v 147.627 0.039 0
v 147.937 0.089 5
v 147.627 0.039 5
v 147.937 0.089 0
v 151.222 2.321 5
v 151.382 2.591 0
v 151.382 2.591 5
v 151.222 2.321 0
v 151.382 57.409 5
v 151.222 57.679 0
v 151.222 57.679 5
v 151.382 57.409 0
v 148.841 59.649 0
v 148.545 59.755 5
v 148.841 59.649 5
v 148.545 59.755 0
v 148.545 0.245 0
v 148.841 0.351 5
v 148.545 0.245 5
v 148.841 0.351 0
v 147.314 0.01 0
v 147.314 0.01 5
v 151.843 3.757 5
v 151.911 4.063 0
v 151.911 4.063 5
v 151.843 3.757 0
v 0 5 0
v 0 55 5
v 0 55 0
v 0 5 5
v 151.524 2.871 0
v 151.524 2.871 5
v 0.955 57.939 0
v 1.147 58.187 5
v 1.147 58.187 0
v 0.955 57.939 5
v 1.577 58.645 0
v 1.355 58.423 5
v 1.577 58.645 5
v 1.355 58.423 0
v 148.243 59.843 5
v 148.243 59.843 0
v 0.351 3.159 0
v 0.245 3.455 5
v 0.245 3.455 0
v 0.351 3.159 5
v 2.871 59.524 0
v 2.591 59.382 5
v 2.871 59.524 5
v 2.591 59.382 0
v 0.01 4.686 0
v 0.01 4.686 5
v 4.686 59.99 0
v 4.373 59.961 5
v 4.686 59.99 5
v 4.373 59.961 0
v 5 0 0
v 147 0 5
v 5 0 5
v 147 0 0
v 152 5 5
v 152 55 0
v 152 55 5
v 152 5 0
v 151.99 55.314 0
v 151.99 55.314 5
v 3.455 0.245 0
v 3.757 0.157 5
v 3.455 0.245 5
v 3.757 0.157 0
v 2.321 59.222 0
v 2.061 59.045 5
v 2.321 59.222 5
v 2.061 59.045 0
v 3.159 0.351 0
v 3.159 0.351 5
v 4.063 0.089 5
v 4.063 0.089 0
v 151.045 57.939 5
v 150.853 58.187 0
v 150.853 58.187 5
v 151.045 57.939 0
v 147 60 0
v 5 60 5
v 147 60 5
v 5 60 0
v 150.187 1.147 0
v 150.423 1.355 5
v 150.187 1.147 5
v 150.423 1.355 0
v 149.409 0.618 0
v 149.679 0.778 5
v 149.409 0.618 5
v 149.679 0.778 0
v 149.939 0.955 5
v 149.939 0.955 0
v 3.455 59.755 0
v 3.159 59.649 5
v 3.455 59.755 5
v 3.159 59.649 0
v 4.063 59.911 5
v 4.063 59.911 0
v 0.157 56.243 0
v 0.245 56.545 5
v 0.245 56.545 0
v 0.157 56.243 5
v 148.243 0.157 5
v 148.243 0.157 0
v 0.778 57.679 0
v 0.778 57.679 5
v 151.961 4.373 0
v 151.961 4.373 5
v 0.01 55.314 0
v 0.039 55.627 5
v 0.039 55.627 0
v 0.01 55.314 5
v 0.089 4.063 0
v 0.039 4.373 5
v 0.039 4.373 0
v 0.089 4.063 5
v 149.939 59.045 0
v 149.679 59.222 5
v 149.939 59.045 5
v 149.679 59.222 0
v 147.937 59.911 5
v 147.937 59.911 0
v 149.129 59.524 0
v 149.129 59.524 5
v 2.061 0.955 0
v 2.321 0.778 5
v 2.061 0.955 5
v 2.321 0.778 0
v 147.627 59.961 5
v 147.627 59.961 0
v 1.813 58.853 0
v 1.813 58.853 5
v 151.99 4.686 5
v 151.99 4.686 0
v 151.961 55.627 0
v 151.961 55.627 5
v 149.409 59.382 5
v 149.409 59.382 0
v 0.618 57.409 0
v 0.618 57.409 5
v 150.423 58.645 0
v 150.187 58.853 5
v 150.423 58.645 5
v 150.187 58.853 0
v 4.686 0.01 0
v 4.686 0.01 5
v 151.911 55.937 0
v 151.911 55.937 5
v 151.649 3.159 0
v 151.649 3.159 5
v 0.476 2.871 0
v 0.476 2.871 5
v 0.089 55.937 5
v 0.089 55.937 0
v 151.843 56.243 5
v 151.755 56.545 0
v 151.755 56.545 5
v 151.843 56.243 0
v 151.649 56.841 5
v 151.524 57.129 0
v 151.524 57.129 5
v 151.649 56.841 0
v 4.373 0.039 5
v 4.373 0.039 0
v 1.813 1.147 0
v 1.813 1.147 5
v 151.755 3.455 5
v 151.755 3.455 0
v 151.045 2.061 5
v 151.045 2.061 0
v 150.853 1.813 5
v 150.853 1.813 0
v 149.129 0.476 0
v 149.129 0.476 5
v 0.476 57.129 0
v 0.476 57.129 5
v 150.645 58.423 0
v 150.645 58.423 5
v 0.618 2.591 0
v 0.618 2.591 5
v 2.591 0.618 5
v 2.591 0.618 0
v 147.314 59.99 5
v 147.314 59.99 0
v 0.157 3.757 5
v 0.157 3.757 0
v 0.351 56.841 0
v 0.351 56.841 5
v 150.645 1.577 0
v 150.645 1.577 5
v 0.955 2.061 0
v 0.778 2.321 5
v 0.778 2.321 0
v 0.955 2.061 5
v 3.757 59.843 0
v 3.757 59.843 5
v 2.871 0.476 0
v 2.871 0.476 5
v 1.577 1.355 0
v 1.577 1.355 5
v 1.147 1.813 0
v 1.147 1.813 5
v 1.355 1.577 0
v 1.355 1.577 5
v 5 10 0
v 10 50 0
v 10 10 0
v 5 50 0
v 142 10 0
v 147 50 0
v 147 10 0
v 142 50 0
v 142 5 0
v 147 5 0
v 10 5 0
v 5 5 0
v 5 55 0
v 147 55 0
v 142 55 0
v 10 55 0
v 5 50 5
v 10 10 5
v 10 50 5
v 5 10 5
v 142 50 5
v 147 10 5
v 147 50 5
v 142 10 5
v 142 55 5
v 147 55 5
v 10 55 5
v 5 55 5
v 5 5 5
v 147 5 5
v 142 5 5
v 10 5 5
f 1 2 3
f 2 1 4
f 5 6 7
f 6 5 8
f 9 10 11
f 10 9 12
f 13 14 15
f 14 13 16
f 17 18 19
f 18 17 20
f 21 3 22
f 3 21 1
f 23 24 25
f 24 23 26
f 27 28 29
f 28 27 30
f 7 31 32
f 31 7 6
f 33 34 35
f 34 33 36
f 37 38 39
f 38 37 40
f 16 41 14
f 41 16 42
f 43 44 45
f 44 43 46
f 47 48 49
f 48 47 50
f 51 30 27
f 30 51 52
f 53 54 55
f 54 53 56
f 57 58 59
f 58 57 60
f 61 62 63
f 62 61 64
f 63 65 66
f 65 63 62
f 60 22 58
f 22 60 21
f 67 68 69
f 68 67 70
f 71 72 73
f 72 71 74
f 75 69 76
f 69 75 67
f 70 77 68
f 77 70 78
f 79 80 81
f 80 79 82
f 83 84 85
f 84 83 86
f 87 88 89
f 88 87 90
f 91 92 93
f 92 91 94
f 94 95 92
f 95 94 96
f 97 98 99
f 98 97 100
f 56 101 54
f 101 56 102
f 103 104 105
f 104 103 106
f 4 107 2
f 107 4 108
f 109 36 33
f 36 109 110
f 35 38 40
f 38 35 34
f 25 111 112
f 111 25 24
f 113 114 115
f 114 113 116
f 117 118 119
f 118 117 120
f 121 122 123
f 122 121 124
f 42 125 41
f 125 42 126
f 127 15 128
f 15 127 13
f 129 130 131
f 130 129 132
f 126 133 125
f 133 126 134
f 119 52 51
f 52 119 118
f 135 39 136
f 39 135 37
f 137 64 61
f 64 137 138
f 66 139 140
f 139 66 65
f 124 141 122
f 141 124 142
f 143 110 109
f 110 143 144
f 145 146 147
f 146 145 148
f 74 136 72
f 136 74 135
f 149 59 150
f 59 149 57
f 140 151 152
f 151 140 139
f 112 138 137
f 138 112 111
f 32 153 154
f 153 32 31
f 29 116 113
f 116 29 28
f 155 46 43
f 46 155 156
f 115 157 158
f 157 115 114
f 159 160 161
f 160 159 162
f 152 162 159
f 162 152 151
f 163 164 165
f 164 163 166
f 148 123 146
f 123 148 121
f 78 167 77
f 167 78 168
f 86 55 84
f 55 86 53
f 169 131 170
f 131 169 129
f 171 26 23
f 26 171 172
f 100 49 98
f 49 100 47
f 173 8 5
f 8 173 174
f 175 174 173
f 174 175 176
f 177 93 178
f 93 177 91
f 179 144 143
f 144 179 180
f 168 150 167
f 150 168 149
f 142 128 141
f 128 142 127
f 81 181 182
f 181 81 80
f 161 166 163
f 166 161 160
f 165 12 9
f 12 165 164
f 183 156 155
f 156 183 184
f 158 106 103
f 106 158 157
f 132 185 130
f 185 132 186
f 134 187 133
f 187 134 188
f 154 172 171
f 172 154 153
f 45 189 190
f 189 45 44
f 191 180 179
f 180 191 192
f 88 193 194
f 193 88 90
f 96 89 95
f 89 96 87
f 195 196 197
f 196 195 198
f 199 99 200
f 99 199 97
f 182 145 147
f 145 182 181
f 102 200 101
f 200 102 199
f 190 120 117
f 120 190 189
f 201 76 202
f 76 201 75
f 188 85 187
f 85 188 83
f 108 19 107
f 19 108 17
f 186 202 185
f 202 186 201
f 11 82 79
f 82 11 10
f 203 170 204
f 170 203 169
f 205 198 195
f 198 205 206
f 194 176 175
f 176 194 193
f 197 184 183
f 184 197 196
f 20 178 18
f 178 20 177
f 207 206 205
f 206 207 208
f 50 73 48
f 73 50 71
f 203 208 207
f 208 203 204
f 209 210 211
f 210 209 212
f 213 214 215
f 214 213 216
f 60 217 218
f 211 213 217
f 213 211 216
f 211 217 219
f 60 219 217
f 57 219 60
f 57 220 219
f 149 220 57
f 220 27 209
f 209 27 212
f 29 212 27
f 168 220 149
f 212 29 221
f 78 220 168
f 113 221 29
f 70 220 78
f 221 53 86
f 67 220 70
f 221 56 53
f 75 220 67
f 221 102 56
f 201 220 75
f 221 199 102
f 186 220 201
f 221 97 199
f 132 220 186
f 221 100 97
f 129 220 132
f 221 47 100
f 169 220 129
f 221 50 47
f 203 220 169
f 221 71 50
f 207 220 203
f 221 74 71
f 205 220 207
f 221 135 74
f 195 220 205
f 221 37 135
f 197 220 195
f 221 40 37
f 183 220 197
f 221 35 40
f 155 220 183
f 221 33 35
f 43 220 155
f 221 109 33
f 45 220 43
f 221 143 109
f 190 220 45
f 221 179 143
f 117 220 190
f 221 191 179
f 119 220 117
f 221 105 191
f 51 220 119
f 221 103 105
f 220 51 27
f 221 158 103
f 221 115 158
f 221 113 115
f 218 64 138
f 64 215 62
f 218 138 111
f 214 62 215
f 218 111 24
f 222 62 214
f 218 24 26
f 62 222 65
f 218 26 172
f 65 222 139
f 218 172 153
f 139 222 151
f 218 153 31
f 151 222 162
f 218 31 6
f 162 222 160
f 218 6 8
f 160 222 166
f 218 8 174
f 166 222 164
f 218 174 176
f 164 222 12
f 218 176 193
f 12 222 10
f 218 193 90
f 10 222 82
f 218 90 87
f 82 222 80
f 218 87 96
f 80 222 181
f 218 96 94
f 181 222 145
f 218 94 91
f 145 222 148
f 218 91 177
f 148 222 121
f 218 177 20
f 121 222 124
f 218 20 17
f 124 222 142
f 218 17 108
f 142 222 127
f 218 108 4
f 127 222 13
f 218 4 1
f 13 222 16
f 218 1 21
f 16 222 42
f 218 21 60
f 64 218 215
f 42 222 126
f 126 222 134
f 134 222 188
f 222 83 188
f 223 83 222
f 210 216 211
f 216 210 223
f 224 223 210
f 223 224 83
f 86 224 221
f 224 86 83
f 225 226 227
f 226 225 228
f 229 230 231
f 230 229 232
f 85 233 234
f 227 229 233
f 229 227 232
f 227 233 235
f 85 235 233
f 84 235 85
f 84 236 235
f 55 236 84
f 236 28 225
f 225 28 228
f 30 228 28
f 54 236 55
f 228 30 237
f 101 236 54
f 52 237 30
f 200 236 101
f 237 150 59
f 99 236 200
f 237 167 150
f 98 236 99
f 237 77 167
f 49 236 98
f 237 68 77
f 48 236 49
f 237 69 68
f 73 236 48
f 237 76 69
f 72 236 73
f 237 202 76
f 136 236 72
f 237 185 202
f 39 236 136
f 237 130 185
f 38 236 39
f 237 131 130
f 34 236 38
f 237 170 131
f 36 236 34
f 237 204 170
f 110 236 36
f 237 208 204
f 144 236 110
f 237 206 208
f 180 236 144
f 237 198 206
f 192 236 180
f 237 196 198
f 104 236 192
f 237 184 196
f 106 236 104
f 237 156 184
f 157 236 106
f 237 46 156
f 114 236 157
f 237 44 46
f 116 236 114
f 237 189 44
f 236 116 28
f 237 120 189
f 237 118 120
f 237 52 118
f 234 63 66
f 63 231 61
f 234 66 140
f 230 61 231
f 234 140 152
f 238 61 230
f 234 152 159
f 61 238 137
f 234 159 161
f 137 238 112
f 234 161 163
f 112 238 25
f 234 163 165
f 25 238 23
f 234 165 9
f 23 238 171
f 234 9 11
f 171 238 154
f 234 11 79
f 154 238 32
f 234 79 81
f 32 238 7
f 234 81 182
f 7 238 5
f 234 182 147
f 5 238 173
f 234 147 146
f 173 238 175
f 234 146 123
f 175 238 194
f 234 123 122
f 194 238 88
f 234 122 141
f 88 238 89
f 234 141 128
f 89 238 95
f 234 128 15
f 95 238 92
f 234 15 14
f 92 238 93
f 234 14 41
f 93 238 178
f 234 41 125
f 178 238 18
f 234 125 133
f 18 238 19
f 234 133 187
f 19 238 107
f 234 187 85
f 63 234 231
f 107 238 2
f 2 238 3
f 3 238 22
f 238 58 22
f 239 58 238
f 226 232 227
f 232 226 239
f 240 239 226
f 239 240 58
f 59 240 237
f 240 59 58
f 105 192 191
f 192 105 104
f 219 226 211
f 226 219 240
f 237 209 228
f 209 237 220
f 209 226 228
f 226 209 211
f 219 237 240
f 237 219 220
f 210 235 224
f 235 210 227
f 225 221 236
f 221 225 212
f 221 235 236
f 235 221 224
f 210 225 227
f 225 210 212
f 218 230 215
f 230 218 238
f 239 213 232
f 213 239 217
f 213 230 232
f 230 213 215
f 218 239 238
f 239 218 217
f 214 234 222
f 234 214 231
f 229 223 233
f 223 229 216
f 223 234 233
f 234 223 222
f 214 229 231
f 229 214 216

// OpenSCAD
/*
 * Simple Modular Frame v1.0
 *
 * http://www.thingiverse.com/thing:1902773
 *
 * By: Maxstupo
 */


/* [Frame Settings] */
// (Select what part to generate):
framePart = 1; // [0:3]

// (The width of the plate):
width = 152;

// (The length of the plate):
length = 60;

// (The height of the plate, also used for the stilt generation):
height = 5;

// (The stilt size, and the stilt slot size):
slotSize = 5;

// (The spacing between the edges of the plate and the stilt slots):
spacing = 5;

// (The plate fillet):
fillet = 10;



/* [Frame 2 Settings] */
// (The width between the mount holes from center-to-center):
mountWidth = 20;

// (The length between the mount holes from center-to-center):
mountLength = 40;

// (The diameter of the mount holes):
mountHoleSize = 3;

// (The spacing from the edge of the plate):
mountSpacingFromEdge = 10;


/* [Frame 3 Settings] */
// (The height of the stilt):
stiltHeight = 50;


/* [Misc] */
// (The tolerance to apply to both plates or stilts):
tolerance = 0;

// (The tolerance for the test part #0):
toleranceTest = 0;

$fn=100;

if(framePart == 0) {
    toleranceTest(rodSize=5,rodLength=30,thickness=5,tolerance=toleranceTest);  
    
} else if (framePart == 1) {
    plate(width, length, height, slotSize + tolerance / 2, spacing, fillet);

} else if (framePart == 2) {
    plateWithMotorMountHoles(width, length, height, slotSize + tolerance / 2, spacing, fillet, mountWidth, mountLength, mountHoleSize, mountSpacingFromEdge);

} else if (framePart == 3) {
    stilt(stiltHeight, slotSize - tolerance / 2, height);

}


module toleranceTest(rodSize=5, rodLength=30, thickness=5,tolerance=0){
    // The hole.
    difference(){
        rs=rodSize+(tolerance/2);
        cube([thickness * 2 + rs, thickness * 2 + rs, rodLength / 3]);
        translate([(thickness * 2 + rs) / 2 - rs / 2, (thickness * 2 + rs) / 2 - rs / 2, -1]) cube([rs, rs, rodLength / 3 + 2]);
    }
    
    // The rod.
    translate([thickness * 2 + rodSize + 10, 0, 0]) cube([rodSize - (tolerance / 2), rodLength, rodSize - (tolerance / 2)]);
}

module plate(width=152, length=60, height=5, slotSize=5, spacing=5, fillet=10) {
    r = min(length, fillet);
    
    difference(){
       
        // The plate. 
        if(r > 0){
            hull(){
                translate([(r / 2), (r / 2), 0]) cylinder(h=height, d=r);
                translate([width - (r / 2), (r / 2), 0]) cylinder(h=height, d=r);
                translate([width - (r / 2), length - (r / 2), 0]) cylinder(h=height, d=r);
                translate([(r / 2), length - (r / 2), 0]) cylinder(h=height, d=r);
            }
        }else{
            cube([width, length, height]);
        }
        
        // Stilt holes.
        translate([spacing, spacing, -1]) cube([slotSize, slotSize, height + 2]);
        translate([spacing, length - slotSize - spacing, -1]) cube([slotSize, slotSize, height + 2]);
        translate([width - slotSize - spacing,  spacing, -1]) cube([slotSize, slotSize, height + 2]);
        translate([width - slotSize - spacing, length - slotSize - spacing, -1]) cube([slotSize, slotSize, height + 2]);
    }
}

module plateWithMotorMountHoles(width=152, length=60, height=5, slotSize=5, spacing=5, fillet=10, mountWidth=20,mountLength=40,mountHoleSize=3,mountSpacingFromEdge=5){
    difference(){
        plate(width, length, height, slotSize, spacing, fillet);
        
        translate([mountSpacingFromEdge + mountHoleSize / 2, length / 2 - mountWidth / 2, -1]){
           translate([0, 0, 0]) cylinder(d=mountHoleSize, h=height + 2);
           translate([mountLength, 0, 0]) cylinder(d=mountHoleSize, h=height + 2);
           translate([0, mountWidth, 0]) cylinder(d=mountHoleSize, h=height + 2);
           translate([mountLength, mountWidth, 0]) cylinder(d=mountHoleSize, h=height + 2);
        }
        
        translate([width - mountLength - mountHoleSize / 2 - mountSpacingFromEdge, length / 2 - mountWidth / 2, -1]){
           translate([0, 0, 0]) cylinder(d=mountHoleSize, h=height + 2);
           translate([mountLength, 0, 0]) cylinder(d=mountHoleSize, h=height + 2);
           translate([0, mountWidth, 0]) cylinder(d=mountHoleSize,h=height + 2);
           translate([mountLength, mountWidth, 0]) cylinder(d=mountHoleSize, h=height + 2);
        }
    }
}

module stilt(height=50, size=10, plateHeight=5) {
    union(){
        cube([height+plateHeight, size, size]);
        translate([plateHeight / 2, size, 0]) rightAngleTriangle(a=size, b=size, height=size);
        translate([height+plateHeight/2, size, size]) rotate([0, 180, 0]) rightAngleTriangle(a=size, b=size, height=size);
    }
}


module rightAngleTriangle(a, b, height=1) {
	aCos = cos(90) * a;
	aSin = sin(90) * a;
	polyhedron(
		points=[[0, 0, 0], [b, 0, 0], [aCos, aSin, 0], [0, 0, height], [b, 0, height], [aCos, aSin, height]],
        faces=[[0, 1, 2], [2, 1, 4, 5], [0, 2, 5, 3], [3, 4, 1, 0], [4, 3, 5]]
    );
}
